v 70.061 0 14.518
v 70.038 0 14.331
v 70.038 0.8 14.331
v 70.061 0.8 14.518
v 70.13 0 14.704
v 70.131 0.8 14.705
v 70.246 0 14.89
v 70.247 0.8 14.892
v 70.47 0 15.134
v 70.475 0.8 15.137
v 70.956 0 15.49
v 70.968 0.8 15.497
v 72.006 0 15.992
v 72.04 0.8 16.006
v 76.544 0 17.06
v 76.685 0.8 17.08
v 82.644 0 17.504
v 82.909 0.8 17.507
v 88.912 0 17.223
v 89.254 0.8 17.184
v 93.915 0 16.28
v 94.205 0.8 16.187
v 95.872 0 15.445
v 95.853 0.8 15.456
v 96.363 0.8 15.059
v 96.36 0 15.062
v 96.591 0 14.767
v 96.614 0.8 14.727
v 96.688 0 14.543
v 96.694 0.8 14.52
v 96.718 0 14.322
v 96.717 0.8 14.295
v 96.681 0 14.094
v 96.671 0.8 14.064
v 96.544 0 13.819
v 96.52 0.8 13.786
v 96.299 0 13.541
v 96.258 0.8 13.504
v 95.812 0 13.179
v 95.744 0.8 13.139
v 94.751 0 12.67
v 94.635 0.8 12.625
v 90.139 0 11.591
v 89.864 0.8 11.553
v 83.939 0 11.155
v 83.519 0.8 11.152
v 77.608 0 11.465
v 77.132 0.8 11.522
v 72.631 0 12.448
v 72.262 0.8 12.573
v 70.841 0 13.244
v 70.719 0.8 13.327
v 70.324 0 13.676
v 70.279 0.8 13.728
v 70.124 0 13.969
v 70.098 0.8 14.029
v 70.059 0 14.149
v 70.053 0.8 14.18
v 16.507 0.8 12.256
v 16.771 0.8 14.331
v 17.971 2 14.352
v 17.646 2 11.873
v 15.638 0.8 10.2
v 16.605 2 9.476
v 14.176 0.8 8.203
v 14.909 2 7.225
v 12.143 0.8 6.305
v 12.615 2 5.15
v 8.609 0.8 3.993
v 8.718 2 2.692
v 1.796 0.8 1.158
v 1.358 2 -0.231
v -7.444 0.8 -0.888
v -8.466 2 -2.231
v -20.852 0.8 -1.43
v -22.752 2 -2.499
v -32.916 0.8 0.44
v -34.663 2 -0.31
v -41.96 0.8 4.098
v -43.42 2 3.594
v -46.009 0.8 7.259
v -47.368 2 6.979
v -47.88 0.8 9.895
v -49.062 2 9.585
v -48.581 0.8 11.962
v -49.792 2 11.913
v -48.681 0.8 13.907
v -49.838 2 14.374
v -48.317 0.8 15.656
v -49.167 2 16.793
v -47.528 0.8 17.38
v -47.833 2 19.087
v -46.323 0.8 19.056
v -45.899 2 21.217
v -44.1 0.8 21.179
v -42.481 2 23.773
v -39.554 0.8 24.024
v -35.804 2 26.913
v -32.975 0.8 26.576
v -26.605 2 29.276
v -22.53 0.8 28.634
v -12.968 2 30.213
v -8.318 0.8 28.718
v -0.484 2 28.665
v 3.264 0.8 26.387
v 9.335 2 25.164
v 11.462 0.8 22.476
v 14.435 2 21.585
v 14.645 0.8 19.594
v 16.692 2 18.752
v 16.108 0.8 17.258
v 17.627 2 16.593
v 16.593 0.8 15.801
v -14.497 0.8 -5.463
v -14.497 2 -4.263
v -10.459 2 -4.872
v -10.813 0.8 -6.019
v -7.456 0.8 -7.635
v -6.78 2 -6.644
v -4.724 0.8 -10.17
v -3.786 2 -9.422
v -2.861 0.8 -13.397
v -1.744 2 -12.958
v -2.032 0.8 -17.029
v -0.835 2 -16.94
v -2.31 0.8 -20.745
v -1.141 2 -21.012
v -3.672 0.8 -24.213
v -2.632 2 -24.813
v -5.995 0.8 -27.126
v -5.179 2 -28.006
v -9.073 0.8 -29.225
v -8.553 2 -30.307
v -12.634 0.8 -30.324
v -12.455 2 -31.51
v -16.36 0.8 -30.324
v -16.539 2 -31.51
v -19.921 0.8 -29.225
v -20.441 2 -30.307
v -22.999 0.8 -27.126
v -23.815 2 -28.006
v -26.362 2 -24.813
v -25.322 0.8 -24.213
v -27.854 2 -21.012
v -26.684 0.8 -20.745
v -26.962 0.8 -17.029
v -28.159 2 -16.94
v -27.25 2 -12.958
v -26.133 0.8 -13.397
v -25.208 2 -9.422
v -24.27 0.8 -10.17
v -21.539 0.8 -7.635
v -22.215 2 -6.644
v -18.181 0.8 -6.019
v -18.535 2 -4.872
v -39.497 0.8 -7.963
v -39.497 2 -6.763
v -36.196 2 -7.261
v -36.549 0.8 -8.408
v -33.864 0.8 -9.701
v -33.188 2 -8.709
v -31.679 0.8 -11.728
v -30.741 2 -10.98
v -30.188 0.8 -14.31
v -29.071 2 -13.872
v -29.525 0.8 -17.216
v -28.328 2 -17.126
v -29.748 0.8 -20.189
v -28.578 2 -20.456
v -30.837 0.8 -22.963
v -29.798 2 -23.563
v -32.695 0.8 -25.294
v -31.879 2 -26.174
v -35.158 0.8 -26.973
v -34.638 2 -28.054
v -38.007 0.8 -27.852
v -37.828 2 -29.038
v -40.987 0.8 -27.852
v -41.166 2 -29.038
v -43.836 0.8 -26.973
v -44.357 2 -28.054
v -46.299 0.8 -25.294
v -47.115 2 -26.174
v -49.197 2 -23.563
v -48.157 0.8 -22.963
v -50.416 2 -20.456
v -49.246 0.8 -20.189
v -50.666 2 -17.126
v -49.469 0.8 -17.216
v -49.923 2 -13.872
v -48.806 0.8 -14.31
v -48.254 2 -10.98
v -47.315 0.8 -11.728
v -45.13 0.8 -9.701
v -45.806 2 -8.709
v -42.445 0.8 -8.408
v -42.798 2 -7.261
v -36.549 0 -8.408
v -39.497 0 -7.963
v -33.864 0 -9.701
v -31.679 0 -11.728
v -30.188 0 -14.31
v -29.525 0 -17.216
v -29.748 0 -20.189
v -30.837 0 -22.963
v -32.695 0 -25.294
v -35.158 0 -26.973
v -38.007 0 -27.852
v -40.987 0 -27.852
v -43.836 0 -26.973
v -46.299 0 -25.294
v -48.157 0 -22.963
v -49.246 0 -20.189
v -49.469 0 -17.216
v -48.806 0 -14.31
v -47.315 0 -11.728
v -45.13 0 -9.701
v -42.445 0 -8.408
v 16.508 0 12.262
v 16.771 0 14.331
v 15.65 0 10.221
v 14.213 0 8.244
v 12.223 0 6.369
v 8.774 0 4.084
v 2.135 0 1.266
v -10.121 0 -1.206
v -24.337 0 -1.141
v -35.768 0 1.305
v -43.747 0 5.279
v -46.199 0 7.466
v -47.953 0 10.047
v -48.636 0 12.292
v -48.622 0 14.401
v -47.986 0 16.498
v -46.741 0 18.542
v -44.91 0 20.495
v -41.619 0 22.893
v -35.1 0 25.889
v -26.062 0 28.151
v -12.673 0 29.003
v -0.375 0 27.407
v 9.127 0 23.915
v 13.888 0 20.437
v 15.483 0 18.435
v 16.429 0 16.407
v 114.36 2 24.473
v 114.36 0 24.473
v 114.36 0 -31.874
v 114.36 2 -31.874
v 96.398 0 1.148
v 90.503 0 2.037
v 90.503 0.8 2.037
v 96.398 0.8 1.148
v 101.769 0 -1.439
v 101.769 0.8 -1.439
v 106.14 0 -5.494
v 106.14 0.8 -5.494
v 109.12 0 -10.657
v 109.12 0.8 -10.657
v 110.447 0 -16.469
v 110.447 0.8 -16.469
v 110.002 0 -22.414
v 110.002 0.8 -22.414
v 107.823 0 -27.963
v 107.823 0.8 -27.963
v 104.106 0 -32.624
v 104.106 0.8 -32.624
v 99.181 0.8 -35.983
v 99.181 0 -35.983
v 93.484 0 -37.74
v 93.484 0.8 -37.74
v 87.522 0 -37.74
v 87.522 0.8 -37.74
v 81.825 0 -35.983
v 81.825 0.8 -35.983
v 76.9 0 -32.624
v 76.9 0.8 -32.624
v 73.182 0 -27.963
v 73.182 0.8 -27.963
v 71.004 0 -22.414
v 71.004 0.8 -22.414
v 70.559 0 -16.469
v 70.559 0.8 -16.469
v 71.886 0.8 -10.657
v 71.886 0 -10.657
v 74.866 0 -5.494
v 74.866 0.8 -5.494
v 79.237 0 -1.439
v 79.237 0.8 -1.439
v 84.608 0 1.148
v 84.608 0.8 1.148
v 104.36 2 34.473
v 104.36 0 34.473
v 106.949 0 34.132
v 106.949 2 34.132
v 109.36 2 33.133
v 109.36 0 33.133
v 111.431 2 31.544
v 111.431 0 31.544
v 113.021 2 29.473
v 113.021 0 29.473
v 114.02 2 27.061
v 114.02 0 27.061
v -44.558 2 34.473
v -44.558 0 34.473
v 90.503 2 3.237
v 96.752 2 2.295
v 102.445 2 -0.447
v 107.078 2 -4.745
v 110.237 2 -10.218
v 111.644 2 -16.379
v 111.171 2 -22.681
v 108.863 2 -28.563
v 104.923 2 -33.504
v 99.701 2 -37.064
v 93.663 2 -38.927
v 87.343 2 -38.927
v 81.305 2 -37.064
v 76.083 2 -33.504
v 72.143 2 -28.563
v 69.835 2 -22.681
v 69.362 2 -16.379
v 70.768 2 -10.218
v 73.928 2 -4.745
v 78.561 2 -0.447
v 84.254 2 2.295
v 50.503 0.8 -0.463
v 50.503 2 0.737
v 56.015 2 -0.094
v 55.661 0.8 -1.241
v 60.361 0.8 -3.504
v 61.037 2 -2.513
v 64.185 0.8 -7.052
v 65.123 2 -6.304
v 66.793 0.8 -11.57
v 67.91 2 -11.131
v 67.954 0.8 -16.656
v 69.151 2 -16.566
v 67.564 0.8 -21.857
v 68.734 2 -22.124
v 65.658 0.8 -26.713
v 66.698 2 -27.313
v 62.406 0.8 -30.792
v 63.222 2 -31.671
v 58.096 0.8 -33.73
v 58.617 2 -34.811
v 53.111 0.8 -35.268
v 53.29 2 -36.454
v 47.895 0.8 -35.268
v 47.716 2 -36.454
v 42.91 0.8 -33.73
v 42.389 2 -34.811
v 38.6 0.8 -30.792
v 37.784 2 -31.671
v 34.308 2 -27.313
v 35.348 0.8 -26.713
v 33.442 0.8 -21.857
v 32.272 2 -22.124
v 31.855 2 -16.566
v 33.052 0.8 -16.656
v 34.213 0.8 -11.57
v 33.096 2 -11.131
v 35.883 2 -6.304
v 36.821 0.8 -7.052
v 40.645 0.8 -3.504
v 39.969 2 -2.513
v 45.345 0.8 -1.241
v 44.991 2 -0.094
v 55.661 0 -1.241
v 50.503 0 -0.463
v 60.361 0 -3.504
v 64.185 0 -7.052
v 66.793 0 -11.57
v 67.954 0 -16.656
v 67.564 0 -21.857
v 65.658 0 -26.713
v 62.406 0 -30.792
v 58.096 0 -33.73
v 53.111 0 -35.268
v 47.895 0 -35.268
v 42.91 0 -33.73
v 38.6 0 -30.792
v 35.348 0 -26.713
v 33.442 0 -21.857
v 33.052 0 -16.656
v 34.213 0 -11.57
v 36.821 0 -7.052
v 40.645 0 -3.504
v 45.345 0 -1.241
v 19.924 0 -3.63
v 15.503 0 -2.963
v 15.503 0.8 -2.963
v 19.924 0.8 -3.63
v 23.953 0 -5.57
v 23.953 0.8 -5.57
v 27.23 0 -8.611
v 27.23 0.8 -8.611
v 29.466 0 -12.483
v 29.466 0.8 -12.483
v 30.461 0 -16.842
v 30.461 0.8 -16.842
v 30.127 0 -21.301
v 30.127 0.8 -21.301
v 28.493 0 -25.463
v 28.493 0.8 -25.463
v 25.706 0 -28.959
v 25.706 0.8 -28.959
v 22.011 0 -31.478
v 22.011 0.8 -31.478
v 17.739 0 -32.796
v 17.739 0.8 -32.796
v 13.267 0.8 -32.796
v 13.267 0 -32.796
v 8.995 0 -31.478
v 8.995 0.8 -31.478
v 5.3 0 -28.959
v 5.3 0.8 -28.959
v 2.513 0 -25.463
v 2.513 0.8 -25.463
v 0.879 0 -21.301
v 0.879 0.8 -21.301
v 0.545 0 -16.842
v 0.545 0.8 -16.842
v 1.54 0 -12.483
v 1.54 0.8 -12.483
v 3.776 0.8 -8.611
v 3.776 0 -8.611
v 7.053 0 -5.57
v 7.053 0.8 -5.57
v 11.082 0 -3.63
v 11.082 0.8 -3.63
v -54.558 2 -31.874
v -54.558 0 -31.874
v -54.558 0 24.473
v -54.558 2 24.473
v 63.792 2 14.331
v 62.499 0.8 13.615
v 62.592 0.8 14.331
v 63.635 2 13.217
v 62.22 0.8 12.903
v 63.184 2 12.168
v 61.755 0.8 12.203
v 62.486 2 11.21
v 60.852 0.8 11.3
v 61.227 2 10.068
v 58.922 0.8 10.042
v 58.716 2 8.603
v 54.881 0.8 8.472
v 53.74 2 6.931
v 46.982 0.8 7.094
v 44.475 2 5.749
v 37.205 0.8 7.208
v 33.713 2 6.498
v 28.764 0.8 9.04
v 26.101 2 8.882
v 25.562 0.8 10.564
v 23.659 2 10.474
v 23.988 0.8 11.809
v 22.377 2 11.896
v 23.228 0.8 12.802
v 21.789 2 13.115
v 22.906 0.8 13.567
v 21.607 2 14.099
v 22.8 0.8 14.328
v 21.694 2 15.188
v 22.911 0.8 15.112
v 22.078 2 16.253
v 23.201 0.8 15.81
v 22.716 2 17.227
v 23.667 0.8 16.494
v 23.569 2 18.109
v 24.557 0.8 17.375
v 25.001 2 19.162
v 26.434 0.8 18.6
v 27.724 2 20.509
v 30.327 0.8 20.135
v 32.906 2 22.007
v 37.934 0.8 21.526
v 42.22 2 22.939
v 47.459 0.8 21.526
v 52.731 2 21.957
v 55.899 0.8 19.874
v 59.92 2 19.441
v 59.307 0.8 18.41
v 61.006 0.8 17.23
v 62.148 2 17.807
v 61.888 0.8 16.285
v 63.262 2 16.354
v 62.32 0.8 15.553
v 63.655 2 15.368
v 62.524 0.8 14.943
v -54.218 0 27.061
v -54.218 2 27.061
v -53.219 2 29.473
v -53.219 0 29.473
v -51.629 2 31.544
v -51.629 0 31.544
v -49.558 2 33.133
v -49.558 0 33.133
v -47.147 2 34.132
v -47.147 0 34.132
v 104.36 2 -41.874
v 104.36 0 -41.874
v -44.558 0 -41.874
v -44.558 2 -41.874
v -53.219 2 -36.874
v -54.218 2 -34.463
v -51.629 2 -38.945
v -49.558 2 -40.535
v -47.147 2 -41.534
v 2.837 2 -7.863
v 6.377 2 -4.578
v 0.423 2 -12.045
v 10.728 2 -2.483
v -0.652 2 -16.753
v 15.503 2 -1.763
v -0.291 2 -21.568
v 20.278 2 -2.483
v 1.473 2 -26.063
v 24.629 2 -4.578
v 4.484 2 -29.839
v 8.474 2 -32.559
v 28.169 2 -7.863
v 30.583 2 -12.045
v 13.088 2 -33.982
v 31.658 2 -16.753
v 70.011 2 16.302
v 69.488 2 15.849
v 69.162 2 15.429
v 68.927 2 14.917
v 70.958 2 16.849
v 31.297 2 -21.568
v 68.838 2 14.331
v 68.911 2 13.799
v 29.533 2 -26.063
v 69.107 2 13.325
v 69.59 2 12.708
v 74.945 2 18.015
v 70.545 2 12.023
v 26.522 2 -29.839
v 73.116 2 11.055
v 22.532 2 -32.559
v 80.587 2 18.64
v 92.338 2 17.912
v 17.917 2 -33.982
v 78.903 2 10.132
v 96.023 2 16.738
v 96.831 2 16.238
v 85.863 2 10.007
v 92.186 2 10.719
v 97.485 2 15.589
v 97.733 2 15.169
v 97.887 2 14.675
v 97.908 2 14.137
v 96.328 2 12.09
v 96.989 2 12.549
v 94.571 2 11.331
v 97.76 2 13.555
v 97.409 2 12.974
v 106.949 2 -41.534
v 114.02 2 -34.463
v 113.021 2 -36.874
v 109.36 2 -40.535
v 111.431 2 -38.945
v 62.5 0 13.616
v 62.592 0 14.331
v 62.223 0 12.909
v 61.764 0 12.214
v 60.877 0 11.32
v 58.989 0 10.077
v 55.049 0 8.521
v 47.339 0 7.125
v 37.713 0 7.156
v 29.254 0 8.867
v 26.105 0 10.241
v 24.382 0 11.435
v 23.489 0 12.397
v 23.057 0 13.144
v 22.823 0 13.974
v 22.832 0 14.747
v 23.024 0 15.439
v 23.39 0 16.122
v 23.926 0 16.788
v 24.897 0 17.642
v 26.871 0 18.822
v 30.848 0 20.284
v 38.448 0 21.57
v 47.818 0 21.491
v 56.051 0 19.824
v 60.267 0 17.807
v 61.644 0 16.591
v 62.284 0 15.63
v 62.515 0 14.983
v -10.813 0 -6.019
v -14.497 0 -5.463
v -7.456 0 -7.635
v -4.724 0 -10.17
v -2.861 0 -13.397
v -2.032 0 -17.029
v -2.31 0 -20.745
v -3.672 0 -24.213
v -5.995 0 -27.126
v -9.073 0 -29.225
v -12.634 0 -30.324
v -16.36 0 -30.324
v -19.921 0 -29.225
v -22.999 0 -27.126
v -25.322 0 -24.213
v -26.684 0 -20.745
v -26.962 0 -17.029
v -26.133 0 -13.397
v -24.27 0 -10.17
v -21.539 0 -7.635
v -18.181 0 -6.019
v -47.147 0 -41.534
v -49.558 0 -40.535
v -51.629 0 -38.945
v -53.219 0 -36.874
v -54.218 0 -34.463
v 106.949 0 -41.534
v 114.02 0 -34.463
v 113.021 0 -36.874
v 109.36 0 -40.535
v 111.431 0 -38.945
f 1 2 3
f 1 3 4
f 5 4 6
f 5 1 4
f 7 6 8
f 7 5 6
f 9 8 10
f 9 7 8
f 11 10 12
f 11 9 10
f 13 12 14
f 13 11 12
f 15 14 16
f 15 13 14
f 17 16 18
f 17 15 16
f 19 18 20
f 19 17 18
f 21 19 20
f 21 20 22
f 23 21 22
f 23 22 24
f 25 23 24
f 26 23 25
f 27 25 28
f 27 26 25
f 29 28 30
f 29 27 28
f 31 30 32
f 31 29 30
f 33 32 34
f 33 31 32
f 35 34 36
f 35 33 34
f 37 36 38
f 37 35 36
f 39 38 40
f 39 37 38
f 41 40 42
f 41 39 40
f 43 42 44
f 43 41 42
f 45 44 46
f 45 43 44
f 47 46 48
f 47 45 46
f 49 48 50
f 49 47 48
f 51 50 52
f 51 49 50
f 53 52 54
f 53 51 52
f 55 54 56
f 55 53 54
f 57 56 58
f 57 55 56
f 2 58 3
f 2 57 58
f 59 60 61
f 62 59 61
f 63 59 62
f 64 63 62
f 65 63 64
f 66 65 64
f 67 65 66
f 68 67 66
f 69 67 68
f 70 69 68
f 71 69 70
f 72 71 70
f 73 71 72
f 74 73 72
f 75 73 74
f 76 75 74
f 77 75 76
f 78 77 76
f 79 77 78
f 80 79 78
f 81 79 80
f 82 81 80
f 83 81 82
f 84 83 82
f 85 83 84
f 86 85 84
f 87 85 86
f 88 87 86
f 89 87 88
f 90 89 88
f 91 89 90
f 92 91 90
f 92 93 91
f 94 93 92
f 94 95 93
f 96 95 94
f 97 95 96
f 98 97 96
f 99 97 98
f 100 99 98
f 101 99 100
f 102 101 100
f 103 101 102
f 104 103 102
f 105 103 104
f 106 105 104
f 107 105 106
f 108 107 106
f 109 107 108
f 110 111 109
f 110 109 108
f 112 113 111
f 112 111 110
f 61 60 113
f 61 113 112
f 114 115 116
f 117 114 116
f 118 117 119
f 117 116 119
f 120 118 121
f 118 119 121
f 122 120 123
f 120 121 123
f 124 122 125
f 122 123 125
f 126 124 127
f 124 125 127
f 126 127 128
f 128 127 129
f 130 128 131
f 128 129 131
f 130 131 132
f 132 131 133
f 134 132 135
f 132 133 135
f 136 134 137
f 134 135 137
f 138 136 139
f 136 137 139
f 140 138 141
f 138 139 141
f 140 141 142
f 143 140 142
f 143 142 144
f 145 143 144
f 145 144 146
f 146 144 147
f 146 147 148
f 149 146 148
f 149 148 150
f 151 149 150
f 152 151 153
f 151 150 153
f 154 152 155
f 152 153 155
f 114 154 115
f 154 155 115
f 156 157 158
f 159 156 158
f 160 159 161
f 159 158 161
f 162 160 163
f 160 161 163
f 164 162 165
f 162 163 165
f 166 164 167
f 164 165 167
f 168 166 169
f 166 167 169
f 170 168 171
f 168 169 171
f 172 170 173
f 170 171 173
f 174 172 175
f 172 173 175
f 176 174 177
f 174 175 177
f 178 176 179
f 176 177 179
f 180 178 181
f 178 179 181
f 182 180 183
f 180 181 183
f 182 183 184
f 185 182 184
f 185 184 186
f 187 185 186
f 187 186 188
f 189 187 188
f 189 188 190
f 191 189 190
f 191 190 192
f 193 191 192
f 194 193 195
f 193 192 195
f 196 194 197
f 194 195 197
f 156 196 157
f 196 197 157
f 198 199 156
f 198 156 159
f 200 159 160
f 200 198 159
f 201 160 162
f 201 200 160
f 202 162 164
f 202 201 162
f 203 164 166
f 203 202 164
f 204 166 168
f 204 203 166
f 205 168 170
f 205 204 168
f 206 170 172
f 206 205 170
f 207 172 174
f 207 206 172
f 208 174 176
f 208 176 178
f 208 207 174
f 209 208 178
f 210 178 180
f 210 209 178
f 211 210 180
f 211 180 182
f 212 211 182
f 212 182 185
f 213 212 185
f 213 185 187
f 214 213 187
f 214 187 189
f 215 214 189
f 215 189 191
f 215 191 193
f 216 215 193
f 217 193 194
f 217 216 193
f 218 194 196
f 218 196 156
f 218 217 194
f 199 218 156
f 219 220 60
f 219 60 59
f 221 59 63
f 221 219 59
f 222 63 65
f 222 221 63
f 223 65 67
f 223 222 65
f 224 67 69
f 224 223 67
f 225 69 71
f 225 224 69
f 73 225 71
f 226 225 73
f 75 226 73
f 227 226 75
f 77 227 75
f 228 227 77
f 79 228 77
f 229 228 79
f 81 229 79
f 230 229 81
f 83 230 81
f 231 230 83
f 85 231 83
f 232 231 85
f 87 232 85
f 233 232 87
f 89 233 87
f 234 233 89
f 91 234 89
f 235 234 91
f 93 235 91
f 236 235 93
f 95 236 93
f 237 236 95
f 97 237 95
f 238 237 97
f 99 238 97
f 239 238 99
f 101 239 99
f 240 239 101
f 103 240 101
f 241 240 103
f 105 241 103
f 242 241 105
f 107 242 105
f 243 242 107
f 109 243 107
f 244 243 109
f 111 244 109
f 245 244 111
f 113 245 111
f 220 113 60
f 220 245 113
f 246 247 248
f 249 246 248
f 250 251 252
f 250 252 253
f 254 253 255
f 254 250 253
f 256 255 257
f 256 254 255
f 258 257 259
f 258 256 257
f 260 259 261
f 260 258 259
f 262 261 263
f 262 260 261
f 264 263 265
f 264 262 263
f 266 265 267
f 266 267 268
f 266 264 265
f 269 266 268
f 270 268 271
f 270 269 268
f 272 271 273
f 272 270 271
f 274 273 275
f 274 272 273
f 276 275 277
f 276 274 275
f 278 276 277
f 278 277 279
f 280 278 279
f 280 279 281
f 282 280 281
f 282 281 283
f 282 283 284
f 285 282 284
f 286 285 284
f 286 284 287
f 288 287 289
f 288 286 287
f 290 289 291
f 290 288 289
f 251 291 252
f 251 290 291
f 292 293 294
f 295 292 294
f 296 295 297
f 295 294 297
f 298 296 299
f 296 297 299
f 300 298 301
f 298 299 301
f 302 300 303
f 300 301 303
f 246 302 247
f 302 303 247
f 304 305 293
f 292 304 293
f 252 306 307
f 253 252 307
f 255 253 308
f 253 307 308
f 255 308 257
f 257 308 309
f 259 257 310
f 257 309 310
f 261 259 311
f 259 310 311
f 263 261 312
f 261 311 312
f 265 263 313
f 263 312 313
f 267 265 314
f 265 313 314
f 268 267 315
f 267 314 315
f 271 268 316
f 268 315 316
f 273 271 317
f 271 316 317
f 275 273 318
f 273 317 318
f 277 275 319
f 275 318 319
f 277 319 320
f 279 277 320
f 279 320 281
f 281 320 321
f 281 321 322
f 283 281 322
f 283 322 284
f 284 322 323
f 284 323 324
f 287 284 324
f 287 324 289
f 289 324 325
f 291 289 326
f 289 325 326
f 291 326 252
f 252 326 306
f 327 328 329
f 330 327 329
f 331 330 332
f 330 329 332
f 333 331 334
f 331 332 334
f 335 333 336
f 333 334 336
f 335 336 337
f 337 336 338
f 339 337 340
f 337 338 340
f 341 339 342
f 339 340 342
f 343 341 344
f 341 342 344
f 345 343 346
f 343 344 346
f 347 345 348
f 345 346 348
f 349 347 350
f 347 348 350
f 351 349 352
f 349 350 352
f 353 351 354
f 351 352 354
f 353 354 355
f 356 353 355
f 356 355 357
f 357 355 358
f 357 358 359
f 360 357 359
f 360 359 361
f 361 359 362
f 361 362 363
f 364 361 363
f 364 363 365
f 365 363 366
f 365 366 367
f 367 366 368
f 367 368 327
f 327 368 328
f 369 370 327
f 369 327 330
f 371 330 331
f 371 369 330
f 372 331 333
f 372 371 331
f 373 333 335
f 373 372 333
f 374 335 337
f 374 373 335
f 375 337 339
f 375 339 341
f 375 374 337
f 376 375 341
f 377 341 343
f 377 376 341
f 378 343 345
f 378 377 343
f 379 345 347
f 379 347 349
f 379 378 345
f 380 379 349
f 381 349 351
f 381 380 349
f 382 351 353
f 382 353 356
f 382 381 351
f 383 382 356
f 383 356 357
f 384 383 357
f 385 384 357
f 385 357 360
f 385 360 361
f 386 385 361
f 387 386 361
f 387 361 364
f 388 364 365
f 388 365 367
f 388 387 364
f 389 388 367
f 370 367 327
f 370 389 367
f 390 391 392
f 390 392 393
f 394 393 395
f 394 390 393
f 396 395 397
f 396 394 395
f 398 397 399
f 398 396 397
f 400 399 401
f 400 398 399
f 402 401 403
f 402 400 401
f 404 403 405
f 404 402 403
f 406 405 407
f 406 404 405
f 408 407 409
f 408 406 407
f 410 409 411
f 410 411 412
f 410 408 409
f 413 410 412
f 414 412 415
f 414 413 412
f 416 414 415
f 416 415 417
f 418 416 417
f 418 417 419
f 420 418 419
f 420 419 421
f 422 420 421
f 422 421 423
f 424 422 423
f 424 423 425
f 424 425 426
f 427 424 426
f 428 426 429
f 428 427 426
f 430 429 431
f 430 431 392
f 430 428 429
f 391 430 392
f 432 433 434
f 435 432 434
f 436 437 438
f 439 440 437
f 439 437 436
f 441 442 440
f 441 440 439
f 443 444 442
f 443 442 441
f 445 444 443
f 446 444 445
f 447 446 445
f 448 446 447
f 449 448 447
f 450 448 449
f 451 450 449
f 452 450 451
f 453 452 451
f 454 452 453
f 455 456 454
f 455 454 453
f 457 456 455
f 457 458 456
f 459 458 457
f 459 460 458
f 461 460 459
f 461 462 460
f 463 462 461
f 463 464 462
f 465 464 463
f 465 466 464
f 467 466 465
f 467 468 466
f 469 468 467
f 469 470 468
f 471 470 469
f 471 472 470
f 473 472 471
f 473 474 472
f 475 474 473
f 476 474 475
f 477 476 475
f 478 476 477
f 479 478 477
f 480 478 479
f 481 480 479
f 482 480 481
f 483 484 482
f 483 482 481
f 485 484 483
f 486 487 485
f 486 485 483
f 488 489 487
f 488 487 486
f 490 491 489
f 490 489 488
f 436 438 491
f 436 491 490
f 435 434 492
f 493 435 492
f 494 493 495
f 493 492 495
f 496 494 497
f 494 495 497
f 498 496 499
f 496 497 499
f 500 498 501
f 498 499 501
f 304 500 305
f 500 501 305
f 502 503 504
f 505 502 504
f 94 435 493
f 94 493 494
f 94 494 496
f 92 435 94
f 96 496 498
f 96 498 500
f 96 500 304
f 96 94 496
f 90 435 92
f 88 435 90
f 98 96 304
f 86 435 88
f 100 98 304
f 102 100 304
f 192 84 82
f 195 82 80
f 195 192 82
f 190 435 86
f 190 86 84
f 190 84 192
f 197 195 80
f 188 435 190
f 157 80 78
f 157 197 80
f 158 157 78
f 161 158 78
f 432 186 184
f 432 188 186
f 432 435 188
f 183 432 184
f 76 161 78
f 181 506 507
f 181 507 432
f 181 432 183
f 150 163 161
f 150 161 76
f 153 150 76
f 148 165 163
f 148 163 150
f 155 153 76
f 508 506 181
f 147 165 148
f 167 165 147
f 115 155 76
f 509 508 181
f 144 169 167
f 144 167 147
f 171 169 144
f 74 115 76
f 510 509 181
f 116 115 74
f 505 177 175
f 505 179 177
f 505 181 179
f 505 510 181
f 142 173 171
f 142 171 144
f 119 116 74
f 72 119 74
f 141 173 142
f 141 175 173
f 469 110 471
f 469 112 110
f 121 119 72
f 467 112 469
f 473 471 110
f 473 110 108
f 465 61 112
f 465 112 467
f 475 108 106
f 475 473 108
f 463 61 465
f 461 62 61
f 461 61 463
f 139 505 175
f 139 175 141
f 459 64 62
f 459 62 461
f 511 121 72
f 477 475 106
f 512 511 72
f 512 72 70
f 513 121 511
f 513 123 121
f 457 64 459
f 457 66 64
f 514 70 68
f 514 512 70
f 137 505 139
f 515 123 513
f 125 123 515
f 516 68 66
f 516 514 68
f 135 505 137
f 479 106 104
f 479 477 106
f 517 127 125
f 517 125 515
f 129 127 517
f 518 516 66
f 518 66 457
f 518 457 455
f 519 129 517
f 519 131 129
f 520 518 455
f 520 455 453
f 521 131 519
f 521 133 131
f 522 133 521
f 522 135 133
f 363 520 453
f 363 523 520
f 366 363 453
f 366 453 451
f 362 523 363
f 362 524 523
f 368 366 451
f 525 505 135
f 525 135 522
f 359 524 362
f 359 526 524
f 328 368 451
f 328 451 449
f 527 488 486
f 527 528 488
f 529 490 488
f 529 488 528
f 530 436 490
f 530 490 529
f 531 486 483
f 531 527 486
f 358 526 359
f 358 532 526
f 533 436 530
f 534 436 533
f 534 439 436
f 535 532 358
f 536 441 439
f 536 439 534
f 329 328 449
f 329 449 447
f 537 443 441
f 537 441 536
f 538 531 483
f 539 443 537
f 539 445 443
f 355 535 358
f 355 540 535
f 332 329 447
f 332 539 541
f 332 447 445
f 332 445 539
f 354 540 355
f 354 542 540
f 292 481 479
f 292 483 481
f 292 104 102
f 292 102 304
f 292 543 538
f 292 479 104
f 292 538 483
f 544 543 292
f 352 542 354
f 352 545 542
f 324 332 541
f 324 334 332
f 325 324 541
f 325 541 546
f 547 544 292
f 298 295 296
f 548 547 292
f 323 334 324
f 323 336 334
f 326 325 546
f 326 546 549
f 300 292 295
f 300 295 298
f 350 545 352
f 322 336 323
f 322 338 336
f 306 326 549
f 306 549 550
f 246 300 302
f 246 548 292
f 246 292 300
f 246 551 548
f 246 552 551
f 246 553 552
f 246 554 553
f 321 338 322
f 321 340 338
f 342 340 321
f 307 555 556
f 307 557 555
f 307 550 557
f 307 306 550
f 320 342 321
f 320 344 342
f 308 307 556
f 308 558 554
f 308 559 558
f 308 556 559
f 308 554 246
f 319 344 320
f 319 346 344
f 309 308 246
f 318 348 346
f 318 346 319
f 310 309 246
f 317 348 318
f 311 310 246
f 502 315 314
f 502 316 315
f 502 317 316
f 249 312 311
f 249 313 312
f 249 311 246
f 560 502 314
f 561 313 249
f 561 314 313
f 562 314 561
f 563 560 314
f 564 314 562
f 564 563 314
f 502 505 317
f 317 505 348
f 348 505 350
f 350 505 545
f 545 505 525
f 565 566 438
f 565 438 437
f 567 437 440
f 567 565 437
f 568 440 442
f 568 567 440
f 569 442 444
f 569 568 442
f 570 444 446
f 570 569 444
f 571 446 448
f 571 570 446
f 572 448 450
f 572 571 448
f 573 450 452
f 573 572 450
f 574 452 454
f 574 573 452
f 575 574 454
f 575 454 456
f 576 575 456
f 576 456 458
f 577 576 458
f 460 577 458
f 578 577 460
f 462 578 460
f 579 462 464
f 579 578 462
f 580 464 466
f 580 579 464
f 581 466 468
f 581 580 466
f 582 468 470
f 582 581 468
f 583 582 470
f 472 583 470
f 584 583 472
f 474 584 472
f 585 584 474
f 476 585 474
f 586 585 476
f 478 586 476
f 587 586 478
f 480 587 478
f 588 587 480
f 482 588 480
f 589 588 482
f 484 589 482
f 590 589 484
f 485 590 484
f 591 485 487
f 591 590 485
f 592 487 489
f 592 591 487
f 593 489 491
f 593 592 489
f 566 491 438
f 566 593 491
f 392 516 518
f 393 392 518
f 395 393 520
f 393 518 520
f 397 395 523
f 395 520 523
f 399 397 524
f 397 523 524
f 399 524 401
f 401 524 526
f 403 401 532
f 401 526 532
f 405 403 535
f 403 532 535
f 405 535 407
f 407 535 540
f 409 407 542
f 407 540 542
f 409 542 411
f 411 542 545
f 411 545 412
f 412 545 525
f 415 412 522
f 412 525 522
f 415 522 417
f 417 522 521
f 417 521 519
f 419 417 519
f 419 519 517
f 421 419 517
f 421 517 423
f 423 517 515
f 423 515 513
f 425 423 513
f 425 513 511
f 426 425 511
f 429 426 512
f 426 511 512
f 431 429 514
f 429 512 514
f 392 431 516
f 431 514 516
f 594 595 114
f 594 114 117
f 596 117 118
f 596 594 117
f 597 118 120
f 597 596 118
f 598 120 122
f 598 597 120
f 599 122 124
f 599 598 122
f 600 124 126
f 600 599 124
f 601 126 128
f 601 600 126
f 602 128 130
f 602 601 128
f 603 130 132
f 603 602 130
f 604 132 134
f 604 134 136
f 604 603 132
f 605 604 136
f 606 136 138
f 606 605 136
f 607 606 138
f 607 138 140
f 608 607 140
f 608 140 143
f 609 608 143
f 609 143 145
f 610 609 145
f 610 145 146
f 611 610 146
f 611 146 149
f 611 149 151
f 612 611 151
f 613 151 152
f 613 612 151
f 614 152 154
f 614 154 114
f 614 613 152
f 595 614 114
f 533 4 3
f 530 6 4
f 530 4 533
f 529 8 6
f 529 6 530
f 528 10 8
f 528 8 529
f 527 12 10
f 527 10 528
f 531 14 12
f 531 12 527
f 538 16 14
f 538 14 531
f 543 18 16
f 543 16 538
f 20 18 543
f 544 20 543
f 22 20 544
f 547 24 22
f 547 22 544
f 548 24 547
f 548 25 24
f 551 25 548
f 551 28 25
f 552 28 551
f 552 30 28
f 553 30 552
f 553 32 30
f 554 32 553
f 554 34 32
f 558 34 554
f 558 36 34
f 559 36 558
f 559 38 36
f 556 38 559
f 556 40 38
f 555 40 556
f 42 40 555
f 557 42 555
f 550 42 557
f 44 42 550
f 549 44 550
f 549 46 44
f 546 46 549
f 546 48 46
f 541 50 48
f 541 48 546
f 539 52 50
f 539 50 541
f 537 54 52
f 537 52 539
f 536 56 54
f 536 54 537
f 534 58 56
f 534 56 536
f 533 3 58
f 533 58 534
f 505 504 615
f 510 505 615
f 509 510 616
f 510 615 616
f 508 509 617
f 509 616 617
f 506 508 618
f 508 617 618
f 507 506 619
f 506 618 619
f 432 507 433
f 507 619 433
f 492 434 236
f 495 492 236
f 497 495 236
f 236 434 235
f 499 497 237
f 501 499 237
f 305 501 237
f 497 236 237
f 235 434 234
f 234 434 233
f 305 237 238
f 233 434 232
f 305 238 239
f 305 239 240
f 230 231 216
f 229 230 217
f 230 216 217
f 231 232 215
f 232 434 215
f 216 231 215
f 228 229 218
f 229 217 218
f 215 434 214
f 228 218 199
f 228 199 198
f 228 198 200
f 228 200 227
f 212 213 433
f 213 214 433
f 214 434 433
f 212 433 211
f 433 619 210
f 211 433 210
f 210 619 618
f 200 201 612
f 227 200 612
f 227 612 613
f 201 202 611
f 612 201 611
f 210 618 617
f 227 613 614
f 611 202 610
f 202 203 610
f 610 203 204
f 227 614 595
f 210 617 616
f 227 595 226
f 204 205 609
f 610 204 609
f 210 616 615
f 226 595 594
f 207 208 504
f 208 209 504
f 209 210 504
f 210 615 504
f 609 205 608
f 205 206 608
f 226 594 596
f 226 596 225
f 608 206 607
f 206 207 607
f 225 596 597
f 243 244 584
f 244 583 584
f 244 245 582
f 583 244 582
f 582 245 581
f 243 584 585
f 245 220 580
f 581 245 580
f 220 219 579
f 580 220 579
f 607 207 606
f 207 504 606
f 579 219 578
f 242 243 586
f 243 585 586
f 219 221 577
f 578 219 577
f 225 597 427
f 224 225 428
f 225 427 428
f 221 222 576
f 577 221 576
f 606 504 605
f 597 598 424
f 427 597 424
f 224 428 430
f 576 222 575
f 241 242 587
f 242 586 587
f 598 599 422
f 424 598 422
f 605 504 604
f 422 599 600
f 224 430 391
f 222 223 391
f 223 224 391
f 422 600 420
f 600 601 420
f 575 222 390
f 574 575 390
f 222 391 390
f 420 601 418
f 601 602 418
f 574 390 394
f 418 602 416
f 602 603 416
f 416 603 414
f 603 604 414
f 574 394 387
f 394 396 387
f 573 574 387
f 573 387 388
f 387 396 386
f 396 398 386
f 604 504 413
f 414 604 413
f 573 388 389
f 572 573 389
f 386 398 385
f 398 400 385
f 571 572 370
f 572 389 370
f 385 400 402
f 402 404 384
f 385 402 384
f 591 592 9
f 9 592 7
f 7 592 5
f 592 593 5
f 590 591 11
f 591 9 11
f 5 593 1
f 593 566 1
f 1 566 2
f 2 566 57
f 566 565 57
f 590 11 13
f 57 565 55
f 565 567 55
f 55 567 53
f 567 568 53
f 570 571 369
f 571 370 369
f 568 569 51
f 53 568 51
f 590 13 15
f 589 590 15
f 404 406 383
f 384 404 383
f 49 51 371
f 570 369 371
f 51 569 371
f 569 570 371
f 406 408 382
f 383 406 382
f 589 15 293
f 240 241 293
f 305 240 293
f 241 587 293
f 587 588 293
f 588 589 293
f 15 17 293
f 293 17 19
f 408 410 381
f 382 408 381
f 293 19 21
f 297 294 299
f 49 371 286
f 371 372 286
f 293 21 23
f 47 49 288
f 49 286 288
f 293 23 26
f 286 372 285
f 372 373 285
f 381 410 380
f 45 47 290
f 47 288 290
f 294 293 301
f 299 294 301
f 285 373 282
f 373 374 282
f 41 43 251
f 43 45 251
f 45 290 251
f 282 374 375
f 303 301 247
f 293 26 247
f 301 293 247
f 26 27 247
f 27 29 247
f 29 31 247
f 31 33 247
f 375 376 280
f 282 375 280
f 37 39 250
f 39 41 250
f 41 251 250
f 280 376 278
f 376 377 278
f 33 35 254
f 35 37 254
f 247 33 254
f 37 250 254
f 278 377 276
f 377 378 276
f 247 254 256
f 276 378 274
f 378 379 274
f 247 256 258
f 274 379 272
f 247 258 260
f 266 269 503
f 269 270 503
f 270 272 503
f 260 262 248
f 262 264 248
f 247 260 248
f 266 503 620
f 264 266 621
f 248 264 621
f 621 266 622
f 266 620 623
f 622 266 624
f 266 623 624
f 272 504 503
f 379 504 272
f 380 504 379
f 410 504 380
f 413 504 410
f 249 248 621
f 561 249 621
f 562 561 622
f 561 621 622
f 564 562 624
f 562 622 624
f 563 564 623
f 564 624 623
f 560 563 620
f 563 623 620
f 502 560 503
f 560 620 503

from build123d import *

# Parameters (mm, degrees)
SKETCH1_R           = 10
SKETCH1_R_2         = 12.5
SKETCH1_R_3         = 15
SKETCH1_R_4         = 17.5
SKETCH1_R_5         = 20
SKETCH1_RX          = 32.743853127
SKETCH1_RY          = 15.28219651
SKETCH1_RX_2        = 19.895942638
SKETCH1_RY_2        = 7.410554201
SKETCH1_RX_3        = 13.340096181
SKETCH1_RY_3        = 3.178438996
BOSS_EXTRUDE1_DEPTH = 2
CHAMFER1_SIZE       = 1.2


with BuildPart() as part:
    # Sketch1 → Boss-Extrude1 (new body)
    with BuildSketch(Plane(origin=(0, 0, 0), x_dir=(1, 0, 0), z_dir=(0, 1, 0))):
        with BuildLine():
            Line((104.360328165, 41.874385695), (-44.558327228, 41.874385695))
            ThreePointArc((-44.558327228, 41.874385695), (-51.62939504, 38.945453507), (-54.558327228, 31.874385695))
            Line((-54.558327228, 31.874385695), (-54.558327228, -24.473029172))
            ThreePointArc((-54.558327228, -24.473029172), (-51.62939504, -31.544096984), (-44.558327228, -34.473029172))
            Line((-44.558327228, -34.473029172), (104.360328165, -34.473029172))
            ThreePointArc((104.360328165, -34.473029172), (111.431395977, -31.544096984), (114.360328165, -24.473029172))
            Line((114.360328165, -24.473029172), (114.360328165, 31.874385695))
            ThreePointArc((114.360328165, 31.874385695), (111.431395977, 38.945453507), (104.360328165, 41.874385695))
        make_face()
        with Locations(Location((-39.497024424, 17.963335967, 0), (0, 0, 270))):
            Circle(SKETCH1_R, mode=Mode.SUBTRACT)
        with Locations(Location((-14.497024424, 17.963335967, 0), (0, 0, 270))):
            Circle(SKETCH1_R_2, mode=Mode.SUBTRACT)
        with Locations(Location((15.502975576, 17.963335967, 0), (0, 0, 270))):
            Circle(SKETCH1_R_3, mode=Mode.SUBTRACT)
        with Locations(Location((50.502975576, 17.963335967, 0), (0, 0, 270))):
            Circle(SKETCH1_R_4, mode=Mode.SUBTRACT)
        with Locations(Location((90.502975576, 17.963335967, 0), (0, 0, 270))):
            Circle(SKETCH1_R_5, mode=Mode.SUBTRACT)
        with Locations(Location((-15.967241465, -13.751099436), (0, 0, -1.014060982))):
            Ellipse(SKETCH1_RX, SKETCH1_RY, mode=Mode.SUBTRACT)
        with Locations(Location((42.696291751, -14.330592911), (0, 0, 0))):
            Ellipse(SKETCH1_RX_2, SKETCH1_RY_2, mode=Mode.SUBTRACT)
        with Locations(Location((83.377613056, -14.330592911), (0, 0, 180))):
            Ellipse(SKETCH1_RX_3, SKETCH1_RY_3, mode=Mode.SUBTRACT)
    extrude(amount=BOSS_EXTRUDE1_DEPTH)

    # Chamfer1
    chamfer1_edges = [part.edges().sort_by_distance(p)[0] for p in [
        (-39.497024424, 2, -27.963335967),
        (-14.497024424, 2, -30.463335967),
        (15.502975576, 2, -32.963335967),
        (50.502975576, 2, -35.463335967),
        (90.502975576, 2, -37.963335967),
        (-48.707079481, 2, 13.305388474),
        (96.685374341, 2, 14.109425159),
        (22.804693335, 2, 14.485444524),
    ]]
    chamfer(chamfer1_edges, length=CHAMFER1_SIZE)


solid = part.part
